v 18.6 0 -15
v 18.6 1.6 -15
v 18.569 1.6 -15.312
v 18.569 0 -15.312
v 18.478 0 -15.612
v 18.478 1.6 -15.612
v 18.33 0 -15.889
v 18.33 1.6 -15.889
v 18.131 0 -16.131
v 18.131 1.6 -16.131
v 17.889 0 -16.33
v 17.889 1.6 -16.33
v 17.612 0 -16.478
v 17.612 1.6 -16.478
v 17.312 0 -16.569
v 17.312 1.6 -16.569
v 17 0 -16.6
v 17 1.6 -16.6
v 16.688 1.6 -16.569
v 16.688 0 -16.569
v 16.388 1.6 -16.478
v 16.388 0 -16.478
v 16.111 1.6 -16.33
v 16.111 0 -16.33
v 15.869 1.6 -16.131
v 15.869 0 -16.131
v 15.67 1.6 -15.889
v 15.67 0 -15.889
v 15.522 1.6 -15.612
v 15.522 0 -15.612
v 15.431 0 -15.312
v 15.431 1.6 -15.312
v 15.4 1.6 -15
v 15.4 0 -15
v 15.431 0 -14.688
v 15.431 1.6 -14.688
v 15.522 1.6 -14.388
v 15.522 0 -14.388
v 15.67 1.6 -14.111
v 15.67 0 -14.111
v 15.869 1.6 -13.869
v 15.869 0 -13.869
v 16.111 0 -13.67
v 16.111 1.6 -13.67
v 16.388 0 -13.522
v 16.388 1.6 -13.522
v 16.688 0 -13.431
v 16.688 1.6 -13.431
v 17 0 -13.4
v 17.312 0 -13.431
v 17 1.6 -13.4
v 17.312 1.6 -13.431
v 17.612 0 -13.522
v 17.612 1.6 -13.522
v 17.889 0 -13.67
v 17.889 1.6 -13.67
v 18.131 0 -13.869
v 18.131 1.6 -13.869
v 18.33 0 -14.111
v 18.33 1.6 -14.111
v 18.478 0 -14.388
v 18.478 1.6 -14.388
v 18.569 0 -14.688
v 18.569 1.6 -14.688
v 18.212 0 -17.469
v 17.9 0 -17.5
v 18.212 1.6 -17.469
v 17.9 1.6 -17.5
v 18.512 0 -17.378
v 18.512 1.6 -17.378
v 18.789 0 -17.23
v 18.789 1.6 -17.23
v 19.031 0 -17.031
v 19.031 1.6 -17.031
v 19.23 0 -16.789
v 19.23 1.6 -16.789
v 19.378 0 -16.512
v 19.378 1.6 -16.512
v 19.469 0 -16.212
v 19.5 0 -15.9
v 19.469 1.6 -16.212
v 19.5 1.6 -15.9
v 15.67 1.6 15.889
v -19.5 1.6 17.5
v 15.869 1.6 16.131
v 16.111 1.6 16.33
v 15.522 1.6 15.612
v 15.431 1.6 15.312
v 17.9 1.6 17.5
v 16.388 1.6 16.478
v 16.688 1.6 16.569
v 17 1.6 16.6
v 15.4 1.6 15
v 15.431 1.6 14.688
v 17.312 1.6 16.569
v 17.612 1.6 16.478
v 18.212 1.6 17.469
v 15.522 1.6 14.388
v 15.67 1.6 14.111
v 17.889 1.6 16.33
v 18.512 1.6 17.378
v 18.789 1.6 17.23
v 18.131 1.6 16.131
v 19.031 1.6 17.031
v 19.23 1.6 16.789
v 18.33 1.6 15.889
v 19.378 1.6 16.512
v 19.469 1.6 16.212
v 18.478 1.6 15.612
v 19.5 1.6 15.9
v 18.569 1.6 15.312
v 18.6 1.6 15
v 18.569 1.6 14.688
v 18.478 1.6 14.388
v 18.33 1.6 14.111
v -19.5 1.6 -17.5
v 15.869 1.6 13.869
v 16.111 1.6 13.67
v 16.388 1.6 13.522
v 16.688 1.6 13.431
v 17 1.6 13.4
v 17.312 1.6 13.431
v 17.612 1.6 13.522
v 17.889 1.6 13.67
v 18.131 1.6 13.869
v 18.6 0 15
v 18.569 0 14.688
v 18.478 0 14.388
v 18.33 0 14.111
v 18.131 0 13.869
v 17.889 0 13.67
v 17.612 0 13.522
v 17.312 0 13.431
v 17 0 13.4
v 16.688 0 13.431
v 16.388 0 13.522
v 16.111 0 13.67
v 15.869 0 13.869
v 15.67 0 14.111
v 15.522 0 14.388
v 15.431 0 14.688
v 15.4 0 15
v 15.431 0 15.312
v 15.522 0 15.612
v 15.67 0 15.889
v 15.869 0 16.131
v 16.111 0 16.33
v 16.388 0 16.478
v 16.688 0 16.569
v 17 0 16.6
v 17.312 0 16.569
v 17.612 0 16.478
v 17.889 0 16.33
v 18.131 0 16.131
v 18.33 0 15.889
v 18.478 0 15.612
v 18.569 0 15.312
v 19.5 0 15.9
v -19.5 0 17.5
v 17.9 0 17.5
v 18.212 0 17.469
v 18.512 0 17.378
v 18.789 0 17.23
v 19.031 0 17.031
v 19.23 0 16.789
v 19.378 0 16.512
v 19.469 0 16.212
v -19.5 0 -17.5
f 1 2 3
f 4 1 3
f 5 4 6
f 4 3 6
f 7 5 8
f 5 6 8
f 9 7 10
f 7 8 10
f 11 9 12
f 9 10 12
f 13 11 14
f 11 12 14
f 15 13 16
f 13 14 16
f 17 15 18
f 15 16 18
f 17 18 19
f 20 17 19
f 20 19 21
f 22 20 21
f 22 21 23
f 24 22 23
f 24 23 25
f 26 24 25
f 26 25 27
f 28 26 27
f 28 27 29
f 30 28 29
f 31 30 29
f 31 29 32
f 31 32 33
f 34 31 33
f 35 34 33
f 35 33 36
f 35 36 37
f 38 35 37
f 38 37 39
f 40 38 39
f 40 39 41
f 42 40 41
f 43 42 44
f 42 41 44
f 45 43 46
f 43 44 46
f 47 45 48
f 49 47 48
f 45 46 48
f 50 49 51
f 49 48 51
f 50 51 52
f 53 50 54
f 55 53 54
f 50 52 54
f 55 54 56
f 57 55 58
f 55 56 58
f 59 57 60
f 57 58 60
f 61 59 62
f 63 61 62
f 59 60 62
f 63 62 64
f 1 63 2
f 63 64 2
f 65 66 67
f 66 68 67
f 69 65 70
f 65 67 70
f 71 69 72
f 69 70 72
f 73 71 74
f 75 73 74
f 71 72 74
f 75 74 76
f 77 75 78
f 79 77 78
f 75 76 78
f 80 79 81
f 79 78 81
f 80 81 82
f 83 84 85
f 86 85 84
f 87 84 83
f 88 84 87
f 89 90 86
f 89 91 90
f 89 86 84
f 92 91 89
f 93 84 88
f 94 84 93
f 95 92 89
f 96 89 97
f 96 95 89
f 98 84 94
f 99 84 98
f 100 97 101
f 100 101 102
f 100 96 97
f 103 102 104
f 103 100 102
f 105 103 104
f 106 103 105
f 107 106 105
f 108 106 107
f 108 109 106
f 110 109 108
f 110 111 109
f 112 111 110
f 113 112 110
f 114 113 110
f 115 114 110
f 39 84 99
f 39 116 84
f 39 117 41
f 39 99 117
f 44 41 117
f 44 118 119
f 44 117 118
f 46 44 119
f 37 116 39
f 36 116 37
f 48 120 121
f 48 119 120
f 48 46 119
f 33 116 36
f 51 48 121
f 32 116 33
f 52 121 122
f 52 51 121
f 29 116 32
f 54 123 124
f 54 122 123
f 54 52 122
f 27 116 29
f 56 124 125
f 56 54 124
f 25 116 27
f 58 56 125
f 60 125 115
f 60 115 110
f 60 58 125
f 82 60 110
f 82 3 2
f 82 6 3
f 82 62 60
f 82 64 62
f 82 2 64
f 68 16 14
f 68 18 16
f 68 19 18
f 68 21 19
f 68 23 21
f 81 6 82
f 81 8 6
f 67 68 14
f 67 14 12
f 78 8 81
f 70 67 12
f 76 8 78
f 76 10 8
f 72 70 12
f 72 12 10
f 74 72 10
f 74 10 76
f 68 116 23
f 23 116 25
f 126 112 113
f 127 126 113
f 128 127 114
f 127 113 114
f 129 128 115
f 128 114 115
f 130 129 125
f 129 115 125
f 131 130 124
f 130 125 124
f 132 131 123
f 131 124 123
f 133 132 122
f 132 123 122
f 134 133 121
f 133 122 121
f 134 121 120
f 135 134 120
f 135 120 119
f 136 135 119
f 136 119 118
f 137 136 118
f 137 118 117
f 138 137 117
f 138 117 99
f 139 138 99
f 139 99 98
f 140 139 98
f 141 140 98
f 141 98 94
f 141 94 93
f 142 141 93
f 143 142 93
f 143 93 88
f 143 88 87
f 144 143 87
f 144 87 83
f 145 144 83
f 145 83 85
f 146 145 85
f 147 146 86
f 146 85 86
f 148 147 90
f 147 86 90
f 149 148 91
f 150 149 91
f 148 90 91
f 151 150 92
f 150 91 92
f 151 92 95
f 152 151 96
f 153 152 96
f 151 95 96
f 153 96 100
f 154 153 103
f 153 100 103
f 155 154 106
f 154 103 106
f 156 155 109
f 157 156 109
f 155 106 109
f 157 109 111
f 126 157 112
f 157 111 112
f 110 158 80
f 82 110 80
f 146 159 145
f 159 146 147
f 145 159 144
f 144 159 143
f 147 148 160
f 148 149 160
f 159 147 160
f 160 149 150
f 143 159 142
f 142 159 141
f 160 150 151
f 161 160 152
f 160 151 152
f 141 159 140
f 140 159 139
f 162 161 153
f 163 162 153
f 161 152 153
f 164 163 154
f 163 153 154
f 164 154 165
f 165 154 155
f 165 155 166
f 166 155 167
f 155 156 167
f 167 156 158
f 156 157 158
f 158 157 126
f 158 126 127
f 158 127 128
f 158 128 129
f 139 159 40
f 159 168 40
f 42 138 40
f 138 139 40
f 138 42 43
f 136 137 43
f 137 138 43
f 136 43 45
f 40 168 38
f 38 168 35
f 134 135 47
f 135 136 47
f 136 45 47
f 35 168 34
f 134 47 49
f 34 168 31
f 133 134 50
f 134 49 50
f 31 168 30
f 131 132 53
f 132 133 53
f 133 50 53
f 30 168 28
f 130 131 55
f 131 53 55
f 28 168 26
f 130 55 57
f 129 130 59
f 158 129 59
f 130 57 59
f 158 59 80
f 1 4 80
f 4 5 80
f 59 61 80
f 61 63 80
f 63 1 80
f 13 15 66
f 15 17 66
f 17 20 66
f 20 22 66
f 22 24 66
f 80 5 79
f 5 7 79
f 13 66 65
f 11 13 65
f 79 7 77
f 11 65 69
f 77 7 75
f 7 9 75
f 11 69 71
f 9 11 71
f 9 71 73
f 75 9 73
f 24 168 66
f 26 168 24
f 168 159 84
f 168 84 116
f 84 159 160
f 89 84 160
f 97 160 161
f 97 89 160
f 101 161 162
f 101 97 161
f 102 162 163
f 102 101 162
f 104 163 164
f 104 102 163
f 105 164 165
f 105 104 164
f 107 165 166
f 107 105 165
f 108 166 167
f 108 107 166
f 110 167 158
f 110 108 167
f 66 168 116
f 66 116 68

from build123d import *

# Parameters (mm, degrees)
SKETCH1_W           = 39
SKETCH1_H           = 35
BOSS_EXTRUDE1_DEPTH = 1.6
CUT_EXTRUDE1_REACH  = 3.6
SKETCH2_R           = 1.6
FILLET1_R           = 1.6


with BuildPart() as part:
    # Sketch1 → Boss-Extrude1 (new body)
    with BuildSketch(Plane(origin=(0, 0, 0), x_dir=(1, 0, 0), z_dir=(0, 1, 0))):
        Rectangle(SKETCH1_W, SKETCH1_H)
    extrude(amount=BOSS_EXTRUDE1_DEPTH)

    # Sketch2 → Cut-Extrude1 (cut, up to next)
    with BuildSketch(Plane(origin=(0, 1.6, 0), x_dir=(1, 0, 0), z_dir=(0, 1, 0)), mode=Mode.PRIVATE) as cut_extrude1_sk1:
        with Locations((17, 15)):
            Circle(SKETCH2_R)
    cut_extrude1_tool1 = extrude(cut_extrude1_sk1.sketch, amount=-CUT_EXTRUDE1_REACH, mode=Mode.PRIVATE) & part.part
    add(cut_extrude1_tool1.solids().sort_by_distance((17, 1.6, -15))[0], mode=Mode.SUBTRACT)
    # Sketch2 → Cut-Extrude1 (cut, up to next)
    with BuildSketch(Plane(origin=(0, 1.6, 0), x_dir=(1, 0, 0), z_dir=(0, 1, 0)), mode=Mode.PRIVATE) as cut_extrude1_sk2:
        with Locations((17, -15)):
            Circle(SKETCH2_R)
    cut_extrude1_tool2 = extrude(cut_extrude1_sk2.sketch, amount=-CUT_EXTRUDE1_REACH, mode=Mode.PRIVATE) & part.part
    add(cut_extrude1_tool2.solids().sort_by_distance((17, 1.6, 15))[0], mode=Mode.SUBTRACT)

    # Fillet1
    fillet1_edges = [part.edges().sort_by_distance(p)[0] for p in [
        (19.5, 0.8, 17.5),
        (19.5, 0.8, -17.5),
    ]]
    fillet(fillet1_edges, radius=FILLET1_R)


solid = part.part
